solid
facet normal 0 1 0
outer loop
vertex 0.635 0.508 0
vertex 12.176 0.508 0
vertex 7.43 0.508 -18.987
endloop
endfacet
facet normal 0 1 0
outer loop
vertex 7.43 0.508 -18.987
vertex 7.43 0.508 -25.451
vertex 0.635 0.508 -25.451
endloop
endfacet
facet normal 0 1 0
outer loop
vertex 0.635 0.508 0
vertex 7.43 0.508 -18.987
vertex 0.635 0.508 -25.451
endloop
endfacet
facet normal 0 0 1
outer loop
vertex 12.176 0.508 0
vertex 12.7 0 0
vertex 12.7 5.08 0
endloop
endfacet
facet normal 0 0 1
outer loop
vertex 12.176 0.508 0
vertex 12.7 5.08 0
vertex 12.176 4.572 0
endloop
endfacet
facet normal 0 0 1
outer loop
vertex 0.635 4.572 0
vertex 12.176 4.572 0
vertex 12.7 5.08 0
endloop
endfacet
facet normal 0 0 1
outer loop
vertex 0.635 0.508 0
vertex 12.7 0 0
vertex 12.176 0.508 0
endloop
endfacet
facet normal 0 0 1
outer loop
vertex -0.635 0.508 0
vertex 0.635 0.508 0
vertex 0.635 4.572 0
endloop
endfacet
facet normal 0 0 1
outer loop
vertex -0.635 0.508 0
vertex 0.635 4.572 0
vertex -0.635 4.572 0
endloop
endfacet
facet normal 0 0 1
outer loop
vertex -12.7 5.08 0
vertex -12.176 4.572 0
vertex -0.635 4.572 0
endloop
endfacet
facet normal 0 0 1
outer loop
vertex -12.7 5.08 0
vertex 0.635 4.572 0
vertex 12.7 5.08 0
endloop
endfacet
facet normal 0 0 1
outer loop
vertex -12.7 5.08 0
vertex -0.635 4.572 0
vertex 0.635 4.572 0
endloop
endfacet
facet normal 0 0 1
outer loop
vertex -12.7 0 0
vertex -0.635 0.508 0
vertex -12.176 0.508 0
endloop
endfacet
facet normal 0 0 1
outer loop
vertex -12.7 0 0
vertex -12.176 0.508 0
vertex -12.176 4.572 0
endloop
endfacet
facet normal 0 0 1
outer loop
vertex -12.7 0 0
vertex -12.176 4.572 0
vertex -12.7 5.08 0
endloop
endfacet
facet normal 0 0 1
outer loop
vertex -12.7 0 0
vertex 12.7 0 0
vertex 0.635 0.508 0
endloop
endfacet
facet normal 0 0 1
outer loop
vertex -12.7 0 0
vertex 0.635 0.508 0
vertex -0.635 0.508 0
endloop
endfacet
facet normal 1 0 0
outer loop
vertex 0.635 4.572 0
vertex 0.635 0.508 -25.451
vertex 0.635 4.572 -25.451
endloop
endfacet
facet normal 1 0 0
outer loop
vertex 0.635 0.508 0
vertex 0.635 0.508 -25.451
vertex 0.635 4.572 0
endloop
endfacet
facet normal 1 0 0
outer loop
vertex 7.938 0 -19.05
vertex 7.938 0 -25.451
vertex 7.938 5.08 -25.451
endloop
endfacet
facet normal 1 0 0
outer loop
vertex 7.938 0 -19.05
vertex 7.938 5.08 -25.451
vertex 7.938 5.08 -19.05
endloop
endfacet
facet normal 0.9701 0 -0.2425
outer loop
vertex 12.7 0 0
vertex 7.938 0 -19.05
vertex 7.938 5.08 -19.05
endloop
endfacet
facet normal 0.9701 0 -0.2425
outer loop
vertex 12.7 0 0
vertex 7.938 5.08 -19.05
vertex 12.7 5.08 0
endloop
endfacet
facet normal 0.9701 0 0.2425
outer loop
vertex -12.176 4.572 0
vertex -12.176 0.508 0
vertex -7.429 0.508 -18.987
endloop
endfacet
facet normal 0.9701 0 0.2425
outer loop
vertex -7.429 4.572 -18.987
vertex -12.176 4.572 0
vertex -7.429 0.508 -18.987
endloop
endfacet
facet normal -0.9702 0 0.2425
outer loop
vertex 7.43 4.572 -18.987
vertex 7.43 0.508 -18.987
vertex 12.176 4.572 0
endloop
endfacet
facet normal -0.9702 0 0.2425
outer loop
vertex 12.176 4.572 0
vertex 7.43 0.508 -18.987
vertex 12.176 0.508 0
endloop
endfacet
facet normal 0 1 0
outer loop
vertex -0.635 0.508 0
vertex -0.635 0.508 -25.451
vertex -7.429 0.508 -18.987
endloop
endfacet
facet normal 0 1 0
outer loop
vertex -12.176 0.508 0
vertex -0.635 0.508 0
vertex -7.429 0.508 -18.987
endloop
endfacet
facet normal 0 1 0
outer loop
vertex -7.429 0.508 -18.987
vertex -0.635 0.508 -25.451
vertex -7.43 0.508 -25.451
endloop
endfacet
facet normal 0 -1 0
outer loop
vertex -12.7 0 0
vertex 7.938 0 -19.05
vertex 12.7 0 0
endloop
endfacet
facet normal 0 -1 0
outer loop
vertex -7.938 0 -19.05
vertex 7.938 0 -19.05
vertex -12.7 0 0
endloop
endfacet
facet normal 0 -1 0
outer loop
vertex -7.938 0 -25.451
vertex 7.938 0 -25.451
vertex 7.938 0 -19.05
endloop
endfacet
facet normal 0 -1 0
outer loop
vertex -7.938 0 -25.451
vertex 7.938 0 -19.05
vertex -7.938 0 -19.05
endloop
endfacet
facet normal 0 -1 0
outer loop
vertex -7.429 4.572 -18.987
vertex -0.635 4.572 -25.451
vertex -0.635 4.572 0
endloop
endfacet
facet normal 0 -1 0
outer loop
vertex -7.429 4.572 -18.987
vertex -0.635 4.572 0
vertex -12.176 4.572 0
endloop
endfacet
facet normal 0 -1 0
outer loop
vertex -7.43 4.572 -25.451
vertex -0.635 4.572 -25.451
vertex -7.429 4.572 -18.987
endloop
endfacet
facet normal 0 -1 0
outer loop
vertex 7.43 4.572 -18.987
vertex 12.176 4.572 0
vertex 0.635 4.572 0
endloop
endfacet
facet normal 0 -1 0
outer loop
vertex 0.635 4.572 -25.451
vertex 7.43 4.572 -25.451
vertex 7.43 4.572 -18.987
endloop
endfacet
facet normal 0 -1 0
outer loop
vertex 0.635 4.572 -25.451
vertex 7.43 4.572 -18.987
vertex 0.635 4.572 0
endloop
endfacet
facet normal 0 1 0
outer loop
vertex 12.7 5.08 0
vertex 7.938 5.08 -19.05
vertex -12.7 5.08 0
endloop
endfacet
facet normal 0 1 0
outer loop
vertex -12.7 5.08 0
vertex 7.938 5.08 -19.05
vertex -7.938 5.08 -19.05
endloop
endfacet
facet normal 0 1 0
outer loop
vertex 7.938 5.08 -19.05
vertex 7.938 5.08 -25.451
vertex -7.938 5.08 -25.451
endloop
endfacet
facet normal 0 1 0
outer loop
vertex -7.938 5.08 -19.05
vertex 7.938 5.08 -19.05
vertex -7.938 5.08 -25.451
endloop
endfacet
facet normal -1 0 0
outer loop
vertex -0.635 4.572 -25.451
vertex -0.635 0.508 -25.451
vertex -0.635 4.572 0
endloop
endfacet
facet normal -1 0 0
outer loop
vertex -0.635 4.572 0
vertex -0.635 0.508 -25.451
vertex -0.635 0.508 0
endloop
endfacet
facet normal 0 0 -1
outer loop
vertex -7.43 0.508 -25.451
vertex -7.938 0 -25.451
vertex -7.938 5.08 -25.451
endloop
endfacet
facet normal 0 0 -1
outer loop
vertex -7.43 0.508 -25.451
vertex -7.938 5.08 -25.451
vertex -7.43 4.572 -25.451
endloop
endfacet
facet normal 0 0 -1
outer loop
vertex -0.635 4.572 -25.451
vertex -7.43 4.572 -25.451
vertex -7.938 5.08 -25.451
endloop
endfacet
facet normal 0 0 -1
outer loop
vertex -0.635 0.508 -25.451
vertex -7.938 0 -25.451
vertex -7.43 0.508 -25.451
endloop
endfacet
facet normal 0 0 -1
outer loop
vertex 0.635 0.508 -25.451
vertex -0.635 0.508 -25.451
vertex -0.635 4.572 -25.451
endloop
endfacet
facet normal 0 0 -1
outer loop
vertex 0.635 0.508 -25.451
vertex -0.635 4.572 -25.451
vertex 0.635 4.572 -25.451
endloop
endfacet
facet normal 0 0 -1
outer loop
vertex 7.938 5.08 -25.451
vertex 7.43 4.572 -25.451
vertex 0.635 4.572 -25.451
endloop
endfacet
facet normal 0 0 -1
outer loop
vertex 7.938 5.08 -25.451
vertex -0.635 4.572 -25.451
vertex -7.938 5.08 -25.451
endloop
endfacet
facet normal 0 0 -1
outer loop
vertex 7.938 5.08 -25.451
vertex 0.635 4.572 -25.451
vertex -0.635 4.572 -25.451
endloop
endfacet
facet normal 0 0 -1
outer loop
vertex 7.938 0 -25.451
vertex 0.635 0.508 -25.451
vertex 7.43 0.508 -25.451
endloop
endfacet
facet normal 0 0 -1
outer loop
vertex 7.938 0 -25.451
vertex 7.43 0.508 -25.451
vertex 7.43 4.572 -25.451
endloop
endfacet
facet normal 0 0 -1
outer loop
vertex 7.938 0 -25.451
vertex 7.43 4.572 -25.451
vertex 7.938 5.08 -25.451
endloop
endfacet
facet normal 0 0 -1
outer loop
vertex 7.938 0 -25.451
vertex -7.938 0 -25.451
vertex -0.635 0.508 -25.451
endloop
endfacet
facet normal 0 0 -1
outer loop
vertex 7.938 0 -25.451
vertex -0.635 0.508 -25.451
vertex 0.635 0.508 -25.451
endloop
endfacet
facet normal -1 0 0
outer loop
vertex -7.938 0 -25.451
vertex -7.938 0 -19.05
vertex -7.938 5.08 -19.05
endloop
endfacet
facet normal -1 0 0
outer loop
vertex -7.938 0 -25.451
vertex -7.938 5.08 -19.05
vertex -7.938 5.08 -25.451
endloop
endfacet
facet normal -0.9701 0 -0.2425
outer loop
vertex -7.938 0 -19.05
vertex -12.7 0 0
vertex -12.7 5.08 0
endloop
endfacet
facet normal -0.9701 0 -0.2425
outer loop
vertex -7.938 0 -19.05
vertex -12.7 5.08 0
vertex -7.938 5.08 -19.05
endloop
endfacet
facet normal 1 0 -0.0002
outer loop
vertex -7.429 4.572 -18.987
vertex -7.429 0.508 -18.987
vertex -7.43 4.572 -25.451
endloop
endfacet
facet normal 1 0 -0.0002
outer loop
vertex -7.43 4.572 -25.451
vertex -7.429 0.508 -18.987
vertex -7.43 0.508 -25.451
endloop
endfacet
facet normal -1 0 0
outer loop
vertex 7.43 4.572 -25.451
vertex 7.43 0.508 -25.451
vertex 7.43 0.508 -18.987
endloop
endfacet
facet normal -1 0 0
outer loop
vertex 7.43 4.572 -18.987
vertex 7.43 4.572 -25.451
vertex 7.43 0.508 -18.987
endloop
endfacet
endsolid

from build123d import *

# Parameters (mm, degrees)
EXTRUDE1_DEPTH = 5.08
SHELL1_T       = -0.508
EXTRUDE2_REACH = 6.572
SKETCH2_W      = 1.27
SKETCH2_H      = 25.4508


with BuildPart() as part:
    # Sketch1 → Extrude1 (new body)
    with BuildSketch(Plane(origin=(0, 0, 0), x_dir=(1, 0, 0), z_dir=(0, 1, 0))):
        Polygon((12.7, 0), (-12.7, 0), (-7.9375, 19.05), (-7.9375, 25.4508), (7.9375, 25.4508), (7.9375, 19.05), align=None)
    extrude(amount=EXTRUDE1_DEPTH)

    # Shell1
    shell1_openings = [part.faces().sort_by_distance(p)[0] for p in [
        (0, 2.54, -25.4508),
        (0, 2.54, 0),
    ]]
    offset(amount=SHELL1_T, openings=shell1_openings, kind=Kind.INTERSECTION)

    # Sketch2 → Extrude2 (add, up to next)
    with BuildSketch(Plane(origin=(0, 0.508, 0), x_dir=(-1, 0, 0), z_dir=(0, 1, 0)), mode=Mode.PRIVATE) as extrude2_sk1:
        with Locations((0, -12.7254)):
            Rectangle(SKETCH2_W, SKETCH2_H)
    extrude2_tool1 = extrude(extrude2_sk1.sketch, amount=EXTRUDE2_REACH, mode=Mode.PRIVATE) - part.part
    add(extrude2_tool1.solids().sort_by_distance((0, 0.508, -12.7254))[0])


solid = part.part
